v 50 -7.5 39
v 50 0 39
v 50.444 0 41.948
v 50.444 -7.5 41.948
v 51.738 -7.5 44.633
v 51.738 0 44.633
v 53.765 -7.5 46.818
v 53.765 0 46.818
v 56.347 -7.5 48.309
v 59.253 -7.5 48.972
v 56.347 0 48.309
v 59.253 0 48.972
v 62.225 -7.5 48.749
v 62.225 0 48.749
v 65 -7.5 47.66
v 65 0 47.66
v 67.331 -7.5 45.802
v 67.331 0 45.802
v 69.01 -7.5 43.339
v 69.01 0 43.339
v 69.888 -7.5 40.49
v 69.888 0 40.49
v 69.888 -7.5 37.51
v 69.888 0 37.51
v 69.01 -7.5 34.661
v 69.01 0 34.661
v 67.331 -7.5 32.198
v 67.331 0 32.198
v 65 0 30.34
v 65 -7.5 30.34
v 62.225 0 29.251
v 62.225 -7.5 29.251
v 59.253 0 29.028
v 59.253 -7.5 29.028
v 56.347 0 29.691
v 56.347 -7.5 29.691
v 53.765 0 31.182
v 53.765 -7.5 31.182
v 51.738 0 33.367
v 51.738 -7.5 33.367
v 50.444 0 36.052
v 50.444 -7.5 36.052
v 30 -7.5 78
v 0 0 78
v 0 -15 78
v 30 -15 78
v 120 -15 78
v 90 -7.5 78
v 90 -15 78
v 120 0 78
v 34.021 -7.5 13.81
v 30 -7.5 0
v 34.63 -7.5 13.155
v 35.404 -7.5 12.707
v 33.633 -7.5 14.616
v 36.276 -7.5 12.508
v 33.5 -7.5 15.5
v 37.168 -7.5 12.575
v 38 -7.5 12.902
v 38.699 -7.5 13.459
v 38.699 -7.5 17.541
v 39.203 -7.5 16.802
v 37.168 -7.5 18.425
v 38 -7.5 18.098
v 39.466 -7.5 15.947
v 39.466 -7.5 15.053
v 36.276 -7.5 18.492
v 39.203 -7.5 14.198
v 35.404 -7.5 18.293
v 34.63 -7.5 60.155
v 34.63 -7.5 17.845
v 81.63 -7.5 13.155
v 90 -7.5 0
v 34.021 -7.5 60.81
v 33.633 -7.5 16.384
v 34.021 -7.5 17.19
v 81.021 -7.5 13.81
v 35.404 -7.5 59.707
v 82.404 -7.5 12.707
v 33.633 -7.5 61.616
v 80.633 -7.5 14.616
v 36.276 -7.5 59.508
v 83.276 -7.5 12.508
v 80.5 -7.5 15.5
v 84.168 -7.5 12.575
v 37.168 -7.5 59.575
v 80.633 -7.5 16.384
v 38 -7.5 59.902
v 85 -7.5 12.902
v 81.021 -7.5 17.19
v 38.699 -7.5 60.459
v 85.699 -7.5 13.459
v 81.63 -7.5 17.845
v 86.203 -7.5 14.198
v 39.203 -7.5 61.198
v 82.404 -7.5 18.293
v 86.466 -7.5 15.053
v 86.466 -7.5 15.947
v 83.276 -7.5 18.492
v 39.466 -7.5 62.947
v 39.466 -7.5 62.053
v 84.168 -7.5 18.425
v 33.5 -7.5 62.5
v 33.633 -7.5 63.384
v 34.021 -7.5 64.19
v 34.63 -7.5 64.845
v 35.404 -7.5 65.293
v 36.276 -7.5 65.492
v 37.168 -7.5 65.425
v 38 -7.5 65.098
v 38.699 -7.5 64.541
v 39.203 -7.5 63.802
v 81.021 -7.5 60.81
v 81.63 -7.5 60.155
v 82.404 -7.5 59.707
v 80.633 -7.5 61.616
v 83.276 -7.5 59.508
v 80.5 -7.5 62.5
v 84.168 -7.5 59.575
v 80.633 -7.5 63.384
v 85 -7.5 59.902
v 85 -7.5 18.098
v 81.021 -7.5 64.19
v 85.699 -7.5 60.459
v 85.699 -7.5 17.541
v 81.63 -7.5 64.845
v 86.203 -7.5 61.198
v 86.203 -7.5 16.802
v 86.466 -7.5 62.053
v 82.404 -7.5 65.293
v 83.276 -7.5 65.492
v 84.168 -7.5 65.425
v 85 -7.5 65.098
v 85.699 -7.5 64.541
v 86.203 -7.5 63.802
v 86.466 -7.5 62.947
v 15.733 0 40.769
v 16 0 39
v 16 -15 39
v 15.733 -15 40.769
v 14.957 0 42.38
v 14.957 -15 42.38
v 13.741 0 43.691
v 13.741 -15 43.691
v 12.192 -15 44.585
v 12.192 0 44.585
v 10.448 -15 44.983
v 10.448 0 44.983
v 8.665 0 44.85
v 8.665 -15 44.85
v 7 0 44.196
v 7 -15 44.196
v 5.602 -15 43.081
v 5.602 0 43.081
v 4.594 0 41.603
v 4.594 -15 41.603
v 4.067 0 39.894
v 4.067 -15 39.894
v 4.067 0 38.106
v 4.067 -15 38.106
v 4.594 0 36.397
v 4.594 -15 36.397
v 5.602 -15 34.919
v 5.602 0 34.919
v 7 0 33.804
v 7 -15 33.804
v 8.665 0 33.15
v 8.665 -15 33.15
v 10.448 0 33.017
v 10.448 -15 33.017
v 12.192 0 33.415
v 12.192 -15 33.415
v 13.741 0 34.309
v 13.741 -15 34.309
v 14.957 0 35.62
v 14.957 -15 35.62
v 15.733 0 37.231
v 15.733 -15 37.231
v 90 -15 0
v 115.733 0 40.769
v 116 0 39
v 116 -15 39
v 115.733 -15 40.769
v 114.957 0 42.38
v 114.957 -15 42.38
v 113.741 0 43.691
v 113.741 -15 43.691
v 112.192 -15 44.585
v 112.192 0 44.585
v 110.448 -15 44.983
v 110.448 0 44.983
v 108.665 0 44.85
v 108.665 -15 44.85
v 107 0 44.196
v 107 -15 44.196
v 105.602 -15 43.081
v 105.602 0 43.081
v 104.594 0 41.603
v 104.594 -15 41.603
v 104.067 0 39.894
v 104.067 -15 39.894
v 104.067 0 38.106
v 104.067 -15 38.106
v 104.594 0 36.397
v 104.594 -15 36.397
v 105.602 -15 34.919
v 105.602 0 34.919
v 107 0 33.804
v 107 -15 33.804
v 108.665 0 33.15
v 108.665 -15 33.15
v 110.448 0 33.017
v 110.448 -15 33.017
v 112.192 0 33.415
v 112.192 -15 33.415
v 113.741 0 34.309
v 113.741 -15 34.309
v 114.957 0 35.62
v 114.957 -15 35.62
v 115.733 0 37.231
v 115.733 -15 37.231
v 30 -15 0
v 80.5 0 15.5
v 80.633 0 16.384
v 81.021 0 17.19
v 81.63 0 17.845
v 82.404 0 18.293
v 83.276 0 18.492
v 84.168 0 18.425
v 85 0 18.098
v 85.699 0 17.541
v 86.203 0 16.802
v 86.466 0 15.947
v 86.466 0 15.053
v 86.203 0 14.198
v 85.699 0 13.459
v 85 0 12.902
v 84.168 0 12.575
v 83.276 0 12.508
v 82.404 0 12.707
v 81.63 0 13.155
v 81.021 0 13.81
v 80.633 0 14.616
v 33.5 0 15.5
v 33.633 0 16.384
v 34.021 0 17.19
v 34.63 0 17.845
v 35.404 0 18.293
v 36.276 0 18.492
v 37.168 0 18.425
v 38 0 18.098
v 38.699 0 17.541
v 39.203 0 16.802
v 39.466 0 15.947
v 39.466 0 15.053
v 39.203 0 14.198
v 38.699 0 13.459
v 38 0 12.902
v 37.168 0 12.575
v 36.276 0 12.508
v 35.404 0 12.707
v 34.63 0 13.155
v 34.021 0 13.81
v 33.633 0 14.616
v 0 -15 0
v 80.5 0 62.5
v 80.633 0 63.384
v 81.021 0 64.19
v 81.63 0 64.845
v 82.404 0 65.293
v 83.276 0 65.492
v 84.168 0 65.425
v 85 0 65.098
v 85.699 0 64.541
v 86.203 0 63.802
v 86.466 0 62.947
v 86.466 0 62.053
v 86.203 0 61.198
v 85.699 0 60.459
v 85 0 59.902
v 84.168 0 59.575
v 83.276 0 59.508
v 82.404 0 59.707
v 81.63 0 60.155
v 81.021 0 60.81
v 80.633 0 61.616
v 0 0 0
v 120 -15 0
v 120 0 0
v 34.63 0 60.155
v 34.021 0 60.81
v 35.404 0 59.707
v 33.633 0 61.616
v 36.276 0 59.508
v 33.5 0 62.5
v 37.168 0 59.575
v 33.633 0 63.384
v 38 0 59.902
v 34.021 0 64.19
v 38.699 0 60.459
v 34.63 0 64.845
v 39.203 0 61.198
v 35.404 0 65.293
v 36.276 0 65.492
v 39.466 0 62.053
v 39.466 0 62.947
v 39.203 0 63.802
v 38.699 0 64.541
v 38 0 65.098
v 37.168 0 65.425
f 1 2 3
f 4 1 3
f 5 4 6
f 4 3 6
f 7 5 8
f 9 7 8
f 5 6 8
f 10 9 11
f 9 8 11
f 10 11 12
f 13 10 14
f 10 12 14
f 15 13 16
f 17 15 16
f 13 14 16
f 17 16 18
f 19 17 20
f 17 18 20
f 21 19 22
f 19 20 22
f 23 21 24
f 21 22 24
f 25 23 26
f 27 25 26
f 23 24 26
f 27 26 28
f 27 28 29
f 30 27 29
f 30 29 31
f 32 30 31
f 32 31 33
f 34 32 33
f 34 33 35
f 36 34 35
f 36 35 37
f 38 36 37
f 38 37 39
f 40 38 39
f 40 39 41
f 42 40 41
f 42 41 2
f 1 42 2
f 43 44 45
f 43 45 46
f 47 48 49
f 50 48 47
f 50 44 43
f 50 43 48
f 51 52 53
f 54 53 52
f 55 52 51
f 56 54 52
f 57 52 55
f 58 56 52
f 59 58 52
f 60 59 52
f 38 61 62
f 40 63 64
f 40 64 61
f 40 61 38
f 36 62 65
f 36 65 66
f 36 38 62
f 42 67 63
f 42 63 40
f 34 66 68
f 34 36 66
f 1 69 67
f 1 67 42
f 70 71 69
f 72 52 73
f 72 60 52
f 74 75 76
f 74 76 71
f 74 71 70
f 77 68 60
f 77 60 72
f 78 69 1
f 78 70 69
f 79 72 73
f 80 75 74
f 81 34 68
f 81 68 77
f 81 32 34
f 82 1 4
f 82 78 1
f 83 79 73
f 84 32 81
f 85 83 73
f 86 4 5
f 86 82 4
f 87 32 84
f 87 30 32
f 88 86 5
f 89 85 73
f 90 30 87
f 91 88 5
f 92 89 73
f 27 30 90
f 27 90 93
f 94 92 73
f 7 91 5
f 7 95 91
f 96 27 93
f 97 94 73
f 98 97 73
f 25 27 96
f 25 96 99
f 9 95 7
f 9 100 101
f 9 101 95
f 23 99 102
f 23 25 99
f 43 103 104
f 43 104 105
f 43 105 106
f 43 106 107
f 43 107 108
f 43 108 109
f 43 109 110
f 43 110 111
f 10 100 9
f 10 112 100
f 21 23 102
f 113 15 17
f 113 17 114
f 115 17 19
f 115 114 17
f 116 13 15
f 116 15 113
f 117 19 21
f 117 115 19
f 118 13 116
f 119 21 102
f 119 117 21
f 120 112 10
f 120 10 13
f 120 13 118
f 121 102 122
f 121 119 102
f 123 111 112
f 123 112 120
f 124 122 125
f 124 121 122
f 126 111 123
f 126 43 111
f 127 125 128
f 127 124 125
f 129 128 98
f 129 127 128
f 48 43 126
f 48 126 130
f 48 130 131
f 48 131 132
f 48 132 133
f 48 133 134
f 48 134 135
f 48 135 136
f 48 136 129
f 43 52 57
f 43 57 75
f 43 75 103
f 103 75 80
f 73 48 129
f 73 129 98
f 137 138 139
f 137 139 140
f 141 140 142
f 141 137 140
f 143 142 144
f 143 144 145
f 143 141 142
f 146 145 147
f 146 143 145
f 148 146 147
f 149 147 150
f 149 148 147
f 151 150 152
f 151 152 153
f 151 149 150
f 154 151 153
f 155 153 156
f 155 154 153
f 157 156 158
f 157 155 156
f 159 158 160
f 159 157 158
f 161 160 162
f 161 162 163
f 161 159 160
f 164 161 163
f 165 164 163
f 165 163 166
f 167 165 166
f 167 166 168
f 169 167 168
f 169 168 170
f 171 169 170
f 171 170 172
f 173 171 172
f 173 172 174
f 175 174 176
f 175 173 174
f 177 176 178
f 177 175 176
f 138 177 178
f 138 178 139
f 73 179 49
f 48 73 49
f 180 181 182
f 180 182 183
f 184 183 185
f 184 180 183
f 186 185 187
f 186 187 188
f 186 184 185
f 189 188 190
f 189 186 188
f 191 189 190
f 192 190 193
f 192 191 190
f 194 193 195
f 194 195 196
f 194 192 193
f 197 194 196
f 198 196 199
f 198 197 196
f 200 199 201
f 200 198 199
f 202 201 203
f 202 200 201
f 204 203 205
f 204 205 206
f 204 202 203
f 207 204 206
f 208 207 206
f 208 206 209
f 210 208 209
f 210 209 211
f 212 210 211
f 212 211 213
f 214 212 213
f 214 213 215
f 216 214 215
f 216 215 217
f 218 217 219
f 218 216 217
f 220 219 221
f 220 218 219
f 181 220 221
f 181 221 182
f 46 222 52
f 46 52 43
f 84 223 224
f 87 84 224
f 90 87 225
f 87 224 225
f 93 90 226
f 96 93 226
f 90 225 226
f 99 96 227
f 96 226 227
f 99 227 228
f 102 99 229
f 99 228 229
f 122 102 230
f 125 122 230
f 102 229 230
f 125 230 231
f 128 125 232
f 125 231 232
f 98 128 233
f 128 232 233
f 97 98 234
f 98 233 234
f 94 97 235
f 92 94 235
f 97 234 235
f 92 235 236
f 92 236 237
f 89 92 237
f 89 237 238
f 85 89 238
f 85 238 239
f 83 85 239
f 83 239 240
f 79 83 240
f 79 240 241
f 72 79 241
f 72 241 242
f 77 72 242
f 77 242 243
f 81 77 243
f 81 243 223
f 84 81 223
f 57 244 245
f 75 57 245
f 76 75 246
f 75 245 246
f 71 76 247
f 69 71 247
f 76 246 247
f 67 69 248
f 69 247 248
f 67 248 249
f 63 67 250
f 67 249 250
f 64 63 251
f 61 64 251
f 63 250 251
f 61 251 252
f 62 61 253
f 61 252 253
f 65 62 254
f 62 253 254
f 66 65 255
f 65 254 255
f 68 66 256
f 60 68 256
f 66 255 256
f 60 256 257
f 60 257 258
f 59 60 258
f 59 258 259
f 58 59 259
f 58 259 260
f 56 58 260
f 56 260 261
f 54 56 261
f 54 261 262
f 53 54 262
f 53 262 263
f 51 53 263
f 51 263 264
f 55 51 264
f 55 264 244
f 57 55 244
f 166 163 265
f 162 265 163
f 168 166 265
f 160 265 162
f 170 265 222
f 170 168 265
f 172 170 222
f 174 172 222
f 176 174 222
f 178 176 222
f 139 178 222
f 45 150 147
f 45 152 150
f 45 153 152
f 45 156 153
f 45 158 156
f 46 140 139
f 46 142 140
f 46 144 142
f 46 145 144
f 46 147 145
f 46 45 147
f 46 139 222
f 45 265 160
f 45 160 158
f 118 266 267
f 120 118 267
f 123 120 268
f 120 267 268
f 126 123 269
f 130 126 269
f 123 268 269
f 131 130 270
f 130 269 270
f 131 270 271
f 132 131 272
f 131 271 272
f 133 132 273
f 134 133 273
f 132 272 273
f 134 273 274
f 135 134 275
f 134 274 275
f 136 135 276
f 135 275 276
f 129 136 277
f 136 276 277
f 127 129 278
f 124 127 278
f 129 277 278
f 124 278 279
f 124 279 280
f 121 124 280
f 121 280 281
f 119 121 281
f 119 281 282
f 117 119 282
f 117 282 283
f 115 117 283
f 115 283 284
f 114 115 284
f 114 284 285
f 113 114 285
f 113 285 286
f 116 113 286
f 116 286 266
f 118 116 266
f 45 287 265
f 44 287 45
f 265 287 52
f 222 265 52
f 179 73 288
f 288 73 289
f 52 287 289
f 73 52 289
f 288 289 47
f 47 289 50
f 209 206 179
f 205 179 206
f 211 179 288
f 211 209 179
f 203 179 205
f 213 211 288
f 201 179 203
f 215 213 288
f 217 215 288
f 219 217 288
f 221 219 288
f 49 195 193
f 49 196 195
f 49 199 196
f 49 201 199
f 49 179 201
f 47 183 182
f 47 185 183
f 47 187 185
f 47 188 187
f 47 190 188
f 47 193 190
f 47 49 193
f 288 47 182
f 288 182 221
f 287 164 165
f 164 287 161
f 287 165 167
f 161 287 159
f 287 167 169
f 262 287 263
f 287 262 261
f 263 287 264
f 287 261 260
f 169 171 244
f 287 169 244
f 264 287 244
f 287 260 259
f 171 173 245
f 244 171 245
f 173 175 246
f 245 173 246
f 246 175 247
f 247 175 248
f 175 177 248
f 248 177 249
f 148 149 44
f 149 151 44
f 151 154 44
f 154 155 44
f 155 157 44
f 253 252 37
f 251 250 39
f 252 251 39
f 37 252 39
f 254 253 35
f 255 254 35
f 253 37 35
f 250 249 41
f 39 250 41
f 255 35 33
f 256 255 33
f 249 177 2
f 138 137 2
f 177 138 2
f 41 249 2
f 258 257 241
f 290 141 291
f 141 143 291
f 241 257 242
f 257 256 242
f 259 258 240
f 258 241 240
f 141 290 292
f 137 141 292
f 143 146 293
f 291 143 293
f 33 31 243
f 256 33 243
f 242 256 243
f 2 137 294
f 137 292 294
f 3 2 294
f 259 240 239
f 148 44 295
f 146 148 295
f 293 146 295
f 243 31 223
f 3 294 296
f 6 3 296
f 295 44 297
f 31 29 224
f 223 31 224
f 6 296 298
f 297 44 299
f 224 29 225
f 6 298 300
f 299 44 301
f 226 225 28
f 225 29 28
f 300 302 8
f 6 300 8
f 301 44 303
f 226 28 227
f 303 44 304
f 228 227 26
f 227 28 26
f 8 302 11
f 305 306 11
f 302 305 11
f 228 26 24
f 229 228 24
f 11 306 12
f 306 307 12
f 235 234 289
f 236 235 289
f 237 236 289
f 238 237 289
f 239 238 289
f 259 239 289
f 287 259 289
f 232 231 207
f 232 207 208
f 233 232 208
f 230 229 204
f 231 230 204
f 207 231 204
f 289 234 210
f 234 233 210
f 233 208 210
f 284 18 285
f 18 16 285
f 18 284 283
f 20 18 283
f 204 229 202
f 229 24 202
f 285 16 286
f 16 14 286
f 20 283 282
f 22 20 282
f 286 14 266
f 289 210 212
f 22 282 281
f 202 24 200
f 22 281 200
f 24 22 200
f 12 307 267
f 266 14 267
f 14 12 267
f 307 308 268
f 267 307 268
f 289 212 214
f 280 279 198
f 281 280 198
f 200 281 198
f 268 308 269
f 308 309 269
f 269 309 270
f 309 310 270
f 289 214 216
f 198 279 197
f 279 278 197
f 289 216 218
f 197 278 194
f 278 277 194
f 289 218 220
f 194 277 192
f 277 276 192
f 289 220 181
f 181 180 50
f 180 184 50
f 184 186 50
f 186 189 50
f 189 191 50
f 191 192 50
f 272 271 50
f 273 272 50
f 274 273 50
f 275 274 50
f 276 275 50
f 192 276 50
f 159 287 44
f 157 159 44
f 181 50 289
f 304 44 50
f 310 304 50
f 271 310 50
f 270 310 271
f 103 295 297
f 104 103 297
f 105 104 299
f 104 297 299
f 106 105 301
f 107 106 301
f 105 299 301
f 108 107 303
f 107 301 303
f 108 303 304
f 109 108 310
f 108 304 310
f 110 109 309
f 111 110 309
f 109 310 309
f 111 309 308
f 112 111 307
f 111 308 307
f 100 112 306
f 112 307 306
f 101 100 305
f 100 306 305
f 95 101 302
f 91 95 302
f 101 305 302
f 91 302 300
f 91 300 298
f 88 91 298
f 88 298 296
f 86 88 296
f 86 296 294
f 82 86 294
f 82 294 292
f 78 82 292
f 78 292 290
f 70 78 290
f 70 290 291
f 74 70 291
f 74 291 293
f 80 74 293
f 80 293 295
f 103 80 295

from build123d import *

# Parameters (mm, degrees)
F0_W     = 120
F0_H     = 78
F0_R     = 6
F1_DEPTH = 15
F2_W     = 60
F2_H     = 78
F3_DEPTH = 7.5
F5_D     = 6
F7_D     = 20


with BuildPart() as f1:
    # F0 (on Front) → F1 (new body)
    with BuildSketch(Plane.XZ):
        with Locations((60, 39)):
            Rectangle(F0_W, F0_H)
        with Locations((10, 39)):
            Circle(F0_R, mode=Mode.SUBTRACT)
        with Locations((110, 39)):
            Circle(F0_R, mode=Mode.SUBTRACT)
    extrude(amount=F1_DEPTH)

    # F2 (on face) → F3 (cut)
    with BuildSketch(Plane.XZ.offset(15)):
        with Locations((60, 39)):
            Rectangle(F2_W, F2_H)
    extrude(amount=-F3_DEPTH, mode=Mode.SUBTRACT)

    # F5 (through all)
    with Locations(Plane.XZ.offset(7.5)):
        with Locations((36.5, 62.5), (36.5, 15.5), (83.5, 15.5), (83.5, 62.5)):
            Hole(F5_D / 2)

    # F7 (through all)
    with Locations(Plane.XZ.offset(7.5)):
        with Locations((60, 39)):
            Hole(F7_D / 2)


solid = f1.part
